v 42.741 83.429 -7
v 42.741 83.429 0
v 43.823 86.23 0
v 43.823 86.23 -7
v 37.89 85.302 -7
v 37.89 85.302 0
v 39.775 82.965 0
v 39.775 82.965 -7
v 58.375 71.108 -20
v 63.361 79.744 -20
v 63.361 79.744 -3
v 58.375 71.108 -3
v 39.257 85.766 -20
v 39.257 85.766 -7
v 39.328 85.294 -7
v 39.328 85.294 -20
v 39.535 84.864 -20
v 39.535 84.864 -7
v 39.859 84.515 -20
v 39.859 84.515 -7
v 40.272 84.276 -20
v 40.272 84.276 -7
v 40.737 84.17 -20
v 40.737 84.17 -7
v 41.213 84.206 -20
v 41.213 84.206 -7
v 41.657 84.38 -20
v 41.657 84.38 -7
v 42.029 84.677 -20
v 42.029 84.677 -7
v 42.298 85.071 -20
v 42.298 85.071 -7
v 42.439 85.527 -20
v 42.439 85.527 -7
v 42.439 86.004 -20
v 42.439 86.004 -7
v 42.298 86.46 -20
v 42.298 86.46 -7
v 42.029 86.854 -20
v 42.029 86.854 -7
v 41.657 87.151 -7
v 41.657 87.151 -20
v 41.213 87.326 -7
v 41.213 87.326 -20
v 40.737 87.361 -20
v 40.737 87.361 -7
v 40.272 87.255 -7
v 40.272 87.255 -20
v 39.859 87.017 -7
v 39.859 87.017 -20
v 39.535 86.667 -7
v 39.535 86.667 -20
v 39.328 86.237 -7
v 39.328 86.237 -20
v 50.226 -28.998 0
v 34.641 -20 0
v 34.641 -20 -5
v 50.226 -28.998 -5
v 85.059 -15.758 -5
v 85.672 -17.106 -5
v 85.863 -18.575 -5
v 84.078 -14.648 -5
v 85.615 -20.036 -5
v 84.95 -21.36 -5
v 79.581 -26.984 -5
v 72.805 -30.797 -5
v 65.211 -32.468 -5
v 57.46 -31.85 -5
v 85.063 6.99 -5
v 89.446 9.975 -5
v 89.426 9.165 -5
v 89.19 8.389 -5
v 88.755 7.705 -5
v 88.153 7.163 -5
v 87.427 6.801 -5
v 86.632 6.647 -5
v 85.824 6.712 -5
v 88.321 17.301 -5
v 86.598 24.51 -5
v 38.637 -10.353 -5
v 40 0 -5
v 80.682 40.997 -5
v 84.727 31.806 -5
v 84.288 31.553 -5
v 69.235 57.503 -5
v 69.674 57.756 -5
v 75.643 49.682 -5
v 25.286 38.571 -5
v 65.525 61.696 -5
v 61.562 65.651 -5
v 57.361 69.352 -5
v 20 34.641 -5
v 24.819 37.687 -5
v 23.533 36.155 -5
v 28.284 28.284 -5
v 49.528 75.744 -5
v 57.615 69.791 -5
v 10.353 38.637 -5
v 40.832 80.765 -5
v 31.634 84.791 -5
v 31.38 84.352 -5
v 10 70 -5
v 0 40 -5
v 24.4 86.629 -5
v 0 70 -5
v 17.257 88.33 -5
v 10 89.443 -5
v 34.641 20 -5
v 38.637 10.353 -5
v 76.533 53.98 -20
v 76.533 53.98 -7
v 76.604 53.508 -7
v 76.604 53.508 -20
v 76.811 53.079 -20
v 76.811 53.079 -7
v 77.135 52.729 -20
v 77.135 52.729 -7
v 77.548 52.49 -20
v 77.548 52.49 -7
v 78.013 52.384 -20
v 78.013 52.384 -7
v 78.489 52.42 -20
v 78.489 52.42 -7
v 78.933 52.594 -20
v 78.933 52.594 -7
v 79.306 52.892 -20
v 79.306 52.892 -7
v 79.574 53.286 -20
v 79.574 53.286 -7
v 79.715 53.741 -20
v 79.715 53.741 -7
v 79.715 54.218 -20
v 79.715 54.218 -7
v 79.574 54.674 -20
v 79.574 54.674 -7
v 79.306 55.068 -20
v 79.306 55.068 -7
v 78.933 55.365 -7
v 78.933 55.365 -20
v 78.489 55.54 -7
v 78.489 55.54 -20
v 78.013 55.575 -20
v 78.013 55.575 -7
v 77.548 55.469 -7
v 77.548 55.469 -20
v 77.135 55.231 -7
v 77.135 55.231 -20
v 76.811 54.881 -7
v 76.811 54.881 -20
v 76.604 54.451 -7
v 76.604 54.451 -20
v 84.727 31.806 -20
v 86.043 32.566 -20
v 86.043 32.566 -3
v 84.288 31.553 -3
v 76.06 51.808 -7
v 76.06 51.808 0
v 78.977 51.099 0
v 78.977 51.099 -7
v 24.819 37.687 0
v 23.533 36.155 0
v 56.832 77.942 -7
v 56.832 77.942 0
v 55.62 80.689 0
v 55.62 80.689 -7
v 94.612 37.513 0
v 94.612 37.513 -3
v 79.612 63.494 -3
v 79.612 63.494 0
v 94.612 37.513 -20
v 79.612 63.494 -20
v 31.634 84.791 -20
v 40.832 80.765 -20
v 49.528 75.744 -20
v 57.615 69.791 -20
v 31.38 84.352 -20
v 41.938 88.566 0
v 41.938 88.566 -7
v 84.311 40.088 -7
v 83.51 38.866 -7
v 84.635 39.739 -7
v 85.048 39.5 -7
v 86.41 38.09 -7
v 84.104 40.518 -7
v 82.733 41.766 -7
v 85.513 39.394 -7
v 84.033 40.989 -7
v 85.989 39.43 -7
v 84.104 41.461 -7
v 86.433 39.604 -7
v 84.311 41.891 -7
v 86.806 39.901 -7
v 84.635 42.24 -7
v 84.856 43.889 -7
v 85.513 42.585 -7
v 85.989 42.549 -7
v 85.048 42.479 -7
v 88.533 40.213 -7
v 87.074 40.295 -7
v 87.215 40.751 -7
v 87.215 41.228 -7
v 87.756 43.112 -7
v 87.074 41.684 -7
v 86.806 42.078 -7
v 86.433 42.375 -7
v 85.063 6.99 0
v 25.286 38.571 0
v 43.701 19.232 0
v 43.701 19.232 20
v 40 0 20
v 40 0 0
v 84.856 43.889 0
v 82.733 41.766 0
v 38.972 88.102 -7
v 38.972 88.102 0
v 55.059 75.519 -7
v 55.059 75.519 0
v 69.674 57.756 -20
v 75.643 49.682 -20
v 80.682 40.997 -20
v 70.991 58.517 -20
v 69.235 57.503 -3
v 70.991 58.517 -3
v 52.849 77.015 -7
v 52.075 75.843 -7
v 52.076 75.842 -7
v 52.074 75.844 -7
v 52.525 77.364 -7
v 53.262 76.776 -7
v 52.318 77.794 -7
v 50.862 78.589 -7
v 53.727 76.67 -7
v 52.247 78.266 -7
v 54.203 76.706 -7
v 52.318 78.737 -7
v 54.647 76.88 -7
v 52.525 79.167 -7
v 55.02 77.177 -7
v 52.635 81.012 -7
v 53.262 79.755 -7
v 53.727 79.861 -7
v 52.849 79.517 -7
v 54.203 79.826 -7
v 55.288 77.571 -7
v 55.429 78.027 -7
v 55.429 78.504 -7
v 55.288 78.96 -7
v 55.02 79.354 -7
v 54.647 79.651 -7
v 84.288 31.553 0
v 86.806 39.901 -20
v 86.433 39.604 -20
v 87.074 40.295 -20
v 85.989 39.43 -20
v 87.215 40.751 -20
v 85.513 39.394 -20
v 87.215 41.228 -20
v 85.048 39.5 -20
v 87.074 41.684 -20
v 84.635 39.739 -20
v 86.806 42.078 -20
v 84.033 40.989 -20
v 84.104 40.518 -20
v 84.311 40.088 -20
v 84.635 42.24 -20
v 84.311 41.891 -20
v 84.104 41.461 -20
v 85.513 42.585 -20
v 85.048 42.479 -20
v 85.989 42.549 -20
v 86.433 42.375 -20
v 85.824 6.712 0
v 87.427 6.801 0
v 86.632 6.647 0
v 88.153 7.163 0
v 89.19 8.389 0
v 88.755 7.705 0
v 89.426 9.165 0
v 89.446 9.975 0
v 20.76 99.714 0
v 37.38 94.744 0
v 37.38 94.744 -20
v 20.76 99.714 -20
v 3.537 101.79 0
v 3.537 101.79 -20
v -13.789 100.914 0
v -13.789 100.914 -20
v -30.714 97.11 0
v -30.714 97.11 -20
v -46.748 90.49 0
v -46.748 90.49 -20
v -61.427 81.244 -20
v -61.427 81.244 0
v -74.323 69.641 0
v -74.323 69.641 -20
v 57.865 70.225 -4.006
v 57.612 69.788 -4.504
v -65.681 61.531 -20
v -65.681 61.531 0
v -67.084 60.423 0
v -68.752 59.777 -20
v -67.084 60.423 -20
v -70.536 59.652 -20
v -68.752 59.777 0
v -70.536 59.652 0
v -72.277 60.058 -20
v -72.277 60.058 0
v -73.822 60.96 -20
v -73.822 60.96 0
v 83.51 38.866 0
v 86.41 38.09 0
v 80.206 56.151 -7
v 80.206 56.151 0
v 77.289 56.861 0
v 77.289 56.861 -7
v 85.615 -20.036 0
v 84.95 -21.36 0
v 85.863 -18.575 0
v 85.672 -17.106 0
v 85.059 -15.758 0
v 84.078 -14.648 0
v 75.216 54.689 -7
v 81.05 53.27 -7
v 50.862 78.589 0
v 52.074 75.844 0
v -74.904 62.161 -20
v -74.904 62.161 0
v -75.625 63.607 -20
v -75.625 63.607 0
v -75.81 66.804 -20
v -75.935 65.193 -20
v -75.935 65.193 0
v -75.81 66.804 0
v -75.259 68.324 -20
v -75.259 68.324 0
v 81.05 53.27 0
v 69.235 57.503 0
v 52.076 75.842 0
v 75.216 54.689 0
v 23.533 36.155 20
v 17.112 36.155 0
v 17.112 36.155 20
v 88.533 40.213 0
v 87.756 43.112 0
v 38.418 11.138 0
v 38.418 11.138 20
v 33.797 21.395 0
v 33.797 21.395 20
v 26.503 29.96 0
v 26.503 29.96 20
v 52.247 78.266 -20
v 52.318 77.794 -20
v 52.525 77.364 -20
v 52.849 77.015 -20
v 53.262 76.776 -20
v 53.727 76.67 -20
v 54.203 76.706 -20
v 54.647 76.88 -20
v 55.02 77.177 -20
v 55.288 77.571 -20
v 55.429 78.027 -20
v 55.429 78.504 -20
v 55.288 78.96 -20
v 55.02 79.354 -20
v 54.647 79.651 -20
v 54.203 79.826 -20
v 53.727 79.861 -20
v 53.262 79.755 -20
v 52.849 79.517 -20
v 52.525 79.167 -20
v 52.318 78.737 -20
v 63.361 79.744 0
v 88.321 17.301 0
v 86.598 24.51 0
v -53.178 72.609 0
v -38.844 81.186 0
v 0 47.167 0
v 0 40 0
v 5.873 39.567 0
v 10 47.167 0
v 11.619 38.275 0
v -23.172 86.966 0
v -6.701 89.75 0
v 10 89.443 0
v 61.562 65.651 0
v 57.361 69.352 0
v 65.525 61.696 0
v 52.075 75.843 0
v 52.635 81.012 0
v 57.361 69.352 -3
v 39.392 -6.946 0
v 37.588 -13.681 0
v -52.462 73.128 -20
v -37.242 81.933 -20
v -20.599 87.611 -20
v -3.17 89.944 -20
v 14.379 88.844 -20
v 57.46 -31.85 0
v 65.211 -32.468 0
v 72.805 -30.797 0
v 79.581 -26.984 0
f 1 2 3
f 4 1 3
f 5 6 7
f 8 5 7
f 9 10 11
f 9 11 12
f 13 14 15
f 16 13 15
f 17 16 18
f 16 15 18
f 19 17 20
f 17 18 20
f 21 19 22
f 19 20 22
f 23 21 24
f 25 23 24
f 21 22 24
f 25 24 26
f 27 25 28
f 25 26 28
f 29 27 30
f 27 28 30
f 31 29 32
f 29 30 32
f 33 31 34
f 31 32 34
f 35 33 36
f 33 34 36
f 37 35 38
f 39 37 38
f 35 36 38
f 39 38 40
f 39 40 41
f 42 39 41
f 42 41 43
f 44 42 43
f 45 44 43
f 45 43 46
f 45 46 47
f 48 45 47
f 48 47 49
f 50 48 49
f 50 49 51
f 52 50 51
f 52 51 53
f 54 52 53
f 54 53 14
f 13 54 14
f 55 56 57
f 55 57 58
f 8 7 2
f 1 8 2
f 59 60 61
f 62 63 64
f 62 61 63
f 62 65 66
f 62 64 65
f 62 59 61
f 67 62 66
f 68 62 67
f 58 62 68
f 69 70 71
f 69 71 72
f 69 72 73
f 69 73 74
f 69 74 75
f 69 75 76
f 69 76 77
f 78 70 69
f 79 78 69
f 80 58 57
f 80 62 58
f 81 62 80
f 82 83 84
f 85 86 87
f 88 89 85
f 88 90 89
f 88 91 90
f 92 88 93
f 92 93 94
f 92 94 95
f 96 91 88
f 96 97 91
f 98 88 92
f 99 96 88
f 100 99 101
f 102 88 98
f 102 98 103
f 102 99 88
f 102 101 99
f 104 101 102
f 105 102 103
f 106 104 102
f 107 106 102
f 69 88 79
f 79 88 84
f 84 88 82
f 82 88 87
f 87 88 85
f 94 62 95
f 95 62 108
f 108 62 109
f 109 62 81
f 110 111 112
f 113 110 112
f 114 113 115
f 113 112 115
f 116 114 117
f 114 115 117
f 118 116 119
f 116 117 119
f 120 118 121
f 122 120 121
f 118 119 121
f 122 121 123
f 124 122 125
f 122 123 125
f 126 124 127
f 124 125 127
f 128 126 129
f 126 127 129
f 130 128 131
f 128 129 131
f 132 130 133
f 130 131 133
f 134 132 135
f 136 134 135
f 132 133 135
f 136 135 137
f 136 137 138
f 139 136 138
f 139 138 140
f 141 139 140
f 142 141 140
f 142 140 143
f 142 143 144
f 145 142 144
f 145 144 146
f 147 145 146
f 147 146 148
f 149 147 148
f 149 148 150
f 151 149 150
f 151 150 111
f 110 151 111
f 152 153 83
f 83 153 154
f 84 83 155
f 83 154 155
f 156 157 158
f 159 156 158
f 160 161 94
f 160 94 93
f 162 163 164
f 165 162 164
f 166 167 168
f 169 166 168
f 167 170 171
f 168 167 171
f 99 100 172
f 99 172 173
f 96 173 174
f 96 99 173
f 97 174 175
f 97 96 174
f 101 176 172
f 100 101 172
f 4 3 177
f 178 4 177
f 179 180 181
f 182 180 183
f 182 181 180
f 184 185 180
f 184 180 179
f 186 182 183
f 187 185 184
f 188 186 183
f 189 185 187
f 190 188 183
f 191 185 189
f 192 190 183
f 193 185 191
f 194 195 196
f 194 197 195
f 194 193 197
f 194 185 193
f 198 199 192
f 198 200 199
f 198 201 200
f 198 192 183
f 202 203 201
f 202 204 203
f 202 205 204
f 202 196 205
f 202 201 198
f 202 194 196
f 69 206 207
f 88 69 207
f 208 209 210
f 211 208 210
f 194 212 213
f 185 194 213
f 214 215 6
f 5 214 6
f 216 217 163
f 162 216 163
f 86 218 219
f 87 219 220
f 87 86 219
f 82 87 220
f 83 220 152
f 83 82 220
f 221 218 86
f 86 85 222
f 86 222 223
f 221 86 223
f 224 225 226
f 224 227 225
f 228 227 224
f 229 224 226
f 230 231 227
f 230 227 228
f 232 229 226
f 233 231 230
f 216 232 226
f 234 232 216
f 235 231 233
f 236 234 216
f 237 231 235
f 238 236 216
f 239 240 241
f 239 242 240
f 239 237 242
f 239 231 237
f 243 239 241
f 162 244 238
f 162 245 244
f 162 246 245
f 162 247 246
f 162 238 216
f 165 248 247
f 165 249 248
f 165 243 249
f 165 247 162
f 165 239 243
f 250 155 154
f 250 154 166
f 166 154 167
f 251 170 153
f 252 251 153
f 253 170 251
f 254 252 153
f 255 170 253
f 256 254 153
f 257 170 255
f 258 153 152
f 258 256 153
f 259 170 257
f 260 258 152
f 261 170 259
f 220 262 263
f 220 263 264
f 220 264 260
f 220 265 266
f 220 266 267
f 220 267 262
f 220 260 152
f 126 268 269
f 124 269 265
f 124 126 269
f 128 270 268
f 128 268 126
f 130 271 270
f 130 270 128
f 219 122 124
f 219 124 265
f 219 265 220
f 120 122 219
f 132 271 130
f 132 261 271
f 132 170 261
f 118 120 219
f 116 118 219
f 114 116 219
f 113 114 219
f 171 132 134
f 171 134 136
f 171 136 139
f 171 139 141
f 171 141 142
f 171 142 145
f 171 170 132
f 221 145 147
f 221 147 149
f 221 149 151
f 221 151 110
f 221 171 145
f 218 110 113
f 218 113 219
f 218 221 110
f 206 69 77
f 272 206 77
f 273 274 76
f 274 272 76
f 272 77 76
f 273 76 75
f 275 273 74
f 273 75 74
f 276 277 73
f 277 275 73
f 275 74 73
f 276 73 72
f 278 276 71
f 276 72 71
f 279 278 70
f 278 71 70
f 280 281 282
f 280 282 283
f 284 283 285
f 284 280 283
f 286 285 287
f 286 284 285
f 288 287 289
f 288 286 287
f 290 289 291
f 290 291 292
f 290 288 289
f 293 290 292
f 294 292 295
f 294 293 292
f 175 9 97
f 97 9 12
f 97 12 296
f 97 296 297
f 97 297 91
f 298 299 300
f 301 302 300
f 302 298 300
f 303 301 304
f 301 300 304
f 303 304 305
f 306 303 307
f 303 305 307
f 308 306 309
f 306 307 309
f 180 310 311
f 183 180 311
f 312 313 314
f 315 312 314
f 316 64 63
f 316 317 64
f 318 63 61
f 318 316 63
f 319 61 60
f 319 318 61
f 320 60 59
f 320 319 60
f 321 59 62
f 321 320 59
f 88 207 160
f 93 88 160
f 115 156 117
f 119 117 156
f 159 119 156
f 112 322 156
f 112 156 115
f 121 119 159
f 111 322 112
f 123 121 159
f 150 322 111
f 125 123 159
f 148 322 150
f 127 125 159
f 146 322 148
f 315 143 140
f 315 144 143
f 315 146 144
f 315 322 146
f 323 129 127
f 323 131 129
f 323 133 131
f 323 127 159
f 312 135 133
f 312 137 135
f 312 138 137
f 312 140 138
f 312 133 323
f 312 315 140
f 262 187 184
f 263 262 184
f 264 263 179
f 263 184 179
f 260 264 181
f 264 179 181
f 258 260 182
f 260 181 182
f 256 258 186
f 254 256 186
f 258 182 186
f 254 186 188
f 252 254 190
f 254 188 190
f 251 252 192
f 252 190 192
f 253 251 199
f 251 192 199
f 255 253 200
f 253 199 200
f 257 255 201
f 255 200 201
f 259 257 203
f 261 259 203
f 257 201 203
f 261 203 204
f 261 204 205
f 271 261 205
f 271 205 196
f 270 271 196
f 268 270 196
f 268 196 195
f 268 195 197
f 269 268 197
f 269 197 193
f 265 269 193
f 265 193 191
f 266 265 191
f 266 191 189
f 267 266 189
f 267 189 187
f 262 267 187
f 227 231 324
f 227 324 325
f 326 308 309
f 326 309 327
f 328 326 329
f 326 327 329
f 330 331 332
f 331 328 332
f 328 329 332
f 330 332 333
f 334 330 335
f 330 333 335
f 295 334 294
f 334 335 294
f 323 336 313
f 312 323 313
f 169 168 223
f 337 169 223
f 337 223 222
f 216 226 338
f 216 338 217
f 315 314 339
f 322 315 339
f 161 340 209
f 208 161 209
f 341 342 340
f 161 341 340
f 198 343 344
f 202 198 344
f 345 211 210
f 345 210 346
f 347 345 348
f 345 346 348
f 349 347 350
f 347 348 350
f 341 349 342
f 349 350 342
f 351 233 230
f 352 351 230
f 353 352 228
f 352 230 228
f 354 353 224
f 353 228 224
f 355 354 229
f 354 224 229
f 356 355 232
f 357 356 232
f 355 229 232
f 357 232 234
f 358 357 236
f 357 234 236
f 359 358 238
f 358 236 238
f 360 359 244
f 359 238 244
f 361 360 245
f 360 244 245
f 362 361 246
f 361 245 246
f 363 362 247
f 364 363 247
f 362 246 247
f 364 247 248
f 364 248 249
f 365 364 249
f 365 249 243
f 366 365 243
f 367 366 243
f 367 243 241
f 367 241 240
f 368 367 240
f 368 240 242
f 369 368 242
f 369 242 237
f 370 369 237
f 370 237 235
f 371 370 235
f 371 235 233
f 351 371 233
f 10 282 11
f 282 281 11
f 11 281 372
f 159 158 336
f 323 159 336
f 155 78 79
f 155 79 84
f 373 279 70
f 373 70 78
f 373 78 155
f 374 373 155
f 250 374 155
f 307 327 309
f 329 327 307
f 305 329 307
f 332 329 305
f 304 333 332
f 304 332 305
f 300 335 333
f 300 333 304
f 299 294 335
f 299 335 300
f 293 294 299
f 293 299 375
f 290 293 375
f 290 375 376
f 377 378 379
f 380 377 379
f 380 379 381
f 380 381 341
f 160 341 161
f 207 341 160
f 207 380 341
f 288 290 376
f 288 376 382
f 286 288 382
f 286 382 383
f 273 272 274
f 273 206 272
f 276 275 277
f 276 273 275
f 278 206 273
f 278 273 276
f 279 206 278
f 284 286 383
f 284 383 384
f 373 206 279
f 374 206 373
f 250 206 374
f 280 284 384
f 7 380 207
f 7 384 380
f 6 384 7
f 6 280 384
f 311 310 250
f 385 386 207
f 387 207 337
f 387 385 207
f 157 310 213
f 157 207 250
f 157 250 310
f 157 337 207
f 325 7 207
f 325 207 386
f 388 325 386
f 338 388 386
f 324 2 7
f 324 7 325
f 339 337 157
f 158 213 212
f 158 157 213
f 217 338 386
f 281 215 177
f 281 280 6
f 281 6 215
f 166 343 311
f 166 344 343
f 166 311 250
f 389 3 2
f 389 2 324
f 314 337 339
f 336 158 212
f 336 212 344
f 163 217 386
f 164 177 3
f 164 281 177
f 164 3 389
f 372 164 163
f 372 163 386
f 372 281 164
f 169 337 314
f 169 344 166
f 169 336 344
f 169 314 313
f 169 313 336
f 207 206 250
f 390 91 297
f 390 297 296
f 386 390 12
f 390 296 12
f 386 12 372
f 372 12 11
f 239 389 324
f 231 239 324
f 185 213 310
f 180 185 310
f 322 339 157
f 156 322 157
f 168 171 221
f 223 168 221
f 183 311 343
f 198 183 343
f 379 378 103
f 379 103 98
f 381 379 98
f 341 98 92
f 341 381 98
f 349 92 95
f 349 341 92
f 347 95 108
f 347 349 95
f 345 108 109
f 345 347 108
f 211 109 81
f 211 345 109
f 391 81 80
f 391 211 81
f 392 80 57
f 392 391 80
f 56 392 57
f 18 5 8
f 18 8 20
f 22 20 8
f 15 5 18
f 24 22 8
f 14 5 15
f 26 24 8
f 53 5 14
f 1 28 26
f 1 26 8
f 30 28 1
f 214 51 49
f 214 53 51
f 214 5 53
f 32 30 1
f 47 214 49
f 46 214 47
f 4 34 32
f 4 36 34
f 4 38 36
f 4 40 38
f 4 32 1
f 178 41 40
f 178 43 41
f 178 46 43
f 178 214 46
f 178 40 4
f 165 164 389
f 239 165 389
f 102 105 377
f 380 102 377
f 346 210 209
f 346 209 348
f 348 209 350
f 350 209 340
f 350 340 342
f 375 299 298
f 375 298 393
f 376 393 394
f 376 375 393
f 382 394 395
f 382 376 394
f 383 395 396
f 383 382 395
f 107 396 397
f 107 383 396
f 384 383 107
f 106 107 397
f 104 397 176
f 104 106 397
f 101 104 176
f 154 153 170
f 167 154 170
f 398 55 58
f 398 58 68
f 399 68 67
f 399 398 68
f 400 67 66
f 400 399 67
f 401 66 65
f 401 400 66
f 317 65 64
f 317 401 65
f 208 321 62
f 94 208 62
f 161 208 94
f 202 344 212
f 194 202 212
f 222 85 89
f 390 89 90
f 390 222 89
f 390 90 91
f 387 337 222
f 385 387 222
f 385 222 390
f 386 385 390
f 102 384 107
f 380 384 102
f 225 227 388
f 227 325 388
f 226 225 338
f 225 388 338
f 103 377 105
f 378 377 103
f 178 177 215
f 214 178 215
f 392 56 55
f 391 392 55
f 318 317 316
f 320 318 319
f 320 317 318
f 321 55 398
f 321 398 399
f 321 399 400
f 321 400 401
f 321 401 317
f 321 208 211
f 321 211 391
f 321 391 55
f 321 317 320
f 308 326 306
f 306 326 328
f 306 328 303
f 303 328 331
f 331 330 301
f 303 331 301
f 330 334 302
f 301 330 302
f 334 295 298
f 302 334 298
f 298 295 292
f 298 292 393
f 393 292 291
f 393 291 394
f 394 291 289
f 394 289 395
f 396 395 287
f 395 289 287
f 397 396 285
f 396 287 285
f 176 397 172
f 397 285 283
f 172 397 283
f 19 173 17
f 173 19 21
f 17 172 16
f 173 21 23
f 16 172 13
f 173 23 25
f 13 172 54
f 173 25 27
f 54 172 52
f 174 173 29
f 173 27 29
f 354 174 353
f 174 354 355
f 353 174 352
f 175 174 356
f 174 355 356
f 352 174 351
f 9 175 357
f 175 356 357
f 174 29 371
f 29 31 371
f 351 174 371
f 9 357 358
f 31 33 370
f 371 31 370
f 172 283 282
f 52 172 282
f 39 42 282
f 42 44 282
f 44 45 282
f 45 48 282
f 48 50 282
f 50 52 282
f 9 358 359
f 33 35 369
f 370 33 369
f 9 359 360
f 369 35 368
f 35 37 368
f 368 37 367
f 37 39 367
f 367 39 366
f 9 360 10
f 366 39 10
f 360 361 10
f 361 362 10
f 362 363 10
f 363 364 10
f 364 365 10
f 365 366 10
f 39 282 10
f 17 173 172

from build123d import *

# Parameters (mm, degrees)
BOSS_EXTRUDE1_DEPTH  = 5
CUT_EXTRUDE1_DEPTH   = 10
BOSS_EXTRUDE3_START  = -3
SKETCH13_R           = 2.5
BOSS_EXTRUDE3_DEPTH  = 3
CHAMFER1_SIZE        = 2
BOSS_EXTRUDE7_DEPTH  = 17
SKETCH22_R           = 1.6
CUT_EXTRUDE4_DEPTH   = 20
CUT_EXTRUDE5_DEPTH   = 7
BOSS_EXTRUDE8_START  = -20
BOSS_EXTRUDE8_DEPTH  = 20
SKETCH26_R           = 90.5
SKETCH26_R_2         = 90
CUT_EXTRUDE6_DEPTH   = 15
BOSS_EXTRUDE9_START  = 20
BOSS_EXTRUDE9_DEPTH  = 20
BOSS_EXTRUDE11_DEPTH = 20
FILLET2_R            = 6
CUT_EXTRUDE8_DEPTH   = 5
FILLET3_R            = 5
CUT_EXTRUDE9_DEPTH   = 5
FILLET4_R            = 3
CUT_EXTRUDE11_DEPTH  = 5
FILLET5_R            = 3


# Some blends are built 0.0001 mm under size
with BuildPart() as part:
    # Sketch1 → Boss-Extrude1 (new body)
    with BuildSketch(Plane.XY):
        with BuildLine():
            Line((10, 70), (0, 70))
            Line((0, 70), (0, 40))
            ThreePointArc((0, 40), (34.641016151, 20), (34.641016151, -20))
            Line((34.641016151, -20), (50.226140717, -28.998075863))
            ThreePointArc((50.226140717, -28.998075863), (74.464134482, -30.098388714), (89.334294573, -10.926290001))
            ThreePointArc((89.334294573, -10.926290001), (70.606727842, 55.809407661), (10, 89.4427191))
            Line((10, 89.4427191), (10, 70))
        make_face()
    extrude(amount=-BOSS_EXTRUDE1_DEPTH)

    # Sketch10 → Cut-Extrude1 (cut)
    with BuildSketch(Plane.ZY):
        Polygon((-5, 70), (0, 47.166644618), (0, 70), align=None)
    extrude(amount=-CUT_EXTRUDE1_DEPTH, mode=Mode.SUBTRACT)

    # Sketch13 → Boss-Extrude3 (add)
    # profile 1 of 2: a face of its own
    with BuildSketch(Plane.XY.offset(BOSS_EXTRUDE3_START)):
        with BuildLine():
            Line((37.380217316, 94.74443559), (31.380217316, 84.352130745))
            ThreePointArc((31.380217316, 84.352130745), (45, 77.942286341), (57.36097943, 69.352130745))
            Line((57.36097943, 69.352130745), (63.36097943, 79.74443559))
            Line((63.36097943, 79.74443559), (37.380217316, 94.74443559))
        make_face()
        with Locations((40.856551784, 85.765623512)):
            Circle(SKETCH13_R, mode=Mode.SUBTRACT)
        with Locations((53.846932841, 78.265623512)):
            Circle(SKETCH13_R, mode=Mode.SUBTRACT)
    # profile 2 of 2: a face of its own
    with BuildSketch(Plane.XY.offset(BOSS_EXTRUDE3_START)):
        with BuildLine():
            Line((79.611529559, 63.493885461), (69.234612109, 57.502769378))
            ThreePointArc((69.234612109, 57.502769378), (77.850059036, 45.159365674), (84.287765503, 31.552695391))
            Line((84.287765503, 31.552695391), (94.611529559, 37.513123348))
            Line((94.611529559, 37.513123348), (79.611529559, 63.493885461))
        make_face()
        with Locations((85.63271748, 40.989457815)):
            Circle(SKETCH13_R, mode=Mode.SUBTRACT)
        with Locations((78.13271748, 53.979838872)):
            Circle(SKETCH13_R, mode=Mode.SUBTRACT)
    extrude(amount=BOSS_EXTRUDE3_DEPTH)

    # Chamfer1
    chamfer1_edges = [part.edges().sort_by_distance(p)[0] for p in [
        (45, 77.942286341, -3),
    ]]
    chamfer(chamfer1_edges, length=CHAMFER1_SIZE - 0.0001)  # a hair under: the kernel refuses the full size

    # Sketch21 → Boss-Extrude7 (add)
    with BuildSketch(Plane(origin=(0, 0, -3), x_dir=(-1, 0, 0), z_dir=(0, 0, -1))):
        with BuildLine():
            Line((-32.394087652, 86.108205679), (-37.380217316, 94.74443559))
            Line((-37.380217316, 94.74443559), (-63.36097943, 79.74443559))
            Line((-63.36097943, 79.74443559), (-58.374849766, 71.108205679))
            ThreePointArc((-58.374849766, 71.108205679), (-46, 79.674337148), (-32.394087652, 86.108205679))
        make_face()
        with BuildLine():
            Line((-86.043250616, 32.566225194), (-94.611529559, 37.513123348))
            Line((-94.611529559, 37.513123348), (-79.611529559, 63.493885461))
            Line((-79.611529559, 63.493885461), (-70.991284652, 58.516984744))
            ThreePointArc((-70.991284652, 58.516984744), (-79.582170095, 46.159269957), (-86.043250616, 32.566225194))
        make_face()
    extrude(amount=BOSS_EXTRUDE7_DEPTH)

    # Sketch22 → Cut-Extrude4 (cut)
    with BuildSketch(Plane.XY):
        with Locations(Location((40.856551784, 85.765623512, 0), (0, 0, 180))):
            Circle(SKETCH22_R)
        with Locations(Location((53.846932841, 78.265623512, 0), (0, 0, 180))):
            Circle(SKETCH22_R)
        with Locations(Location((78.13271748, 53.979838872, 0), (0, 0, 180))):
            Circle(SKETCH22_R)
        with Locations(Location((85.63271748, 40.989457815, 0), (0, 0, 180))):
            Circle(SKETCH22_R)
    extrude(amount=-CUT_EXTRUDE4_DEPTH, mode=Mode.SUBTRACT)

    # Sketch24 → Cut-Extrude5 (cut)
    with BuildSketch(Plane.XY):
        Polygon((42.741480602, 83.428878621), (43.82269663, 86.229647308), (41.937767812, 88.566392198), (38.971622965, 88.102368402), (37.890406937, 85.301599716), (39.775335756, 82.964854825), align=None)
        Polygon((55.059031292, 75.518961778), (56.831660903, 77.942000695), (55.619562452, 80.688662429), (52.634834389, 81.012285245), (50.862204778, 78.589246328), (52.074303229, 75.842584594), align=None)
        Polygon((78.97688632, 51.098743194), (81.049903948, 53.270362694), (80.205735108, 56.151458371), (77.28854864, 56.860934549), (75.215531013, 54.68931505), (76.059699853, 51.808219373), align=None)
        Polygon((86.409892613, 38.089572965), (88.532678995, 40.212568798), (87.755503862, 43.112453649), (84.855542347, 43.889342666), (82.732755965, 41.766346832), (83.509931098, 38.866461981), align=None)
    extrude(amount=-CUT_EXTRUDE5_DEPTH, mode=Mode.SUBTRACT)

    # Sketch25 → Boss-Extrude8 (add)
    with BuildSketch(Plane(origin=(0, 0, -20), x_dir=(-1, 0, 0), z_dir=(0, 0, -1)).offset(BOSS_EXTRUDE8_START)):
        with BuildLine():
            Line((-86.043250616, 32.566225194), (-84.287765503, 31.552695391))
            ThreePointArc((-84.287765503, 31.552695391), (-77.850059036, 45.159365674), (-69.234612109, 57.502769378))
            Line((-69.234612109, 57.502769378), (-70.991284652, 58.516984744))
            ThreePointArc((-70.991284652, 58.516984744), (-79.582170095, 46.159269957), (-86.043250616, 32.566225194))
        make_face()
        with BuildLine():
            Line((-58.374849766, 71.108205679), (-57.36097943, 69.352130745))
            ThreePointArc((-57.36097943, 69.352130745), (-45, 77.942286341), (-31.380217316, 84.352130745))
            Line((-31.380217316, 84.352130745), (-32.394087652, 86.108205679))
            ThreePointArc((-32.394087652, 86.108205679), (-46, 79.674337148), (-58.374849766, 71.108205679))
        make_face()
    extrude(amount=BOSS_EXTRUDE8_DEPTH)

    # Sketch26 → Cut-Extrude6 (cut)
    with BuildSketch(Plane(origin=(0, 0, -5), x_dir=(-1, 0, 0), z_dir=(0, 0, -1))):
        Circle(SKETCH26_R)
        Circle(SKETCH26_R_2, mode=Mode.SUBTRACT)
    extrude(amount=CUT_EXTRUDE6_DEPTH, mode=Mode.SUBTRACT)

    # Sketch28 → Boss-Extrude9 (add)
    with BuildSketch(Plane.XY.offset(BOSS_EXTRUDE9_START)):
        with BuildLine():
            Line((23.533293218, 36.154783936), (43.701329204, 19.231792379))
            Line((43.701329204, 19.231792379), (40, 0))
            ThreePointArc((40, 0), (33.797136862, 21.395175623), (17.112323002, 36.154783936))
            Line((17.112323002, 36.154783936), (23.533293218, 36.154783936))
        make_face()
    extrude(amount=-BOSS_EXTRUDE9_DEPTH)

    # Sketch30 → Boss-Extrude11 (add)
    with BuildSketch(Plane.XY):
        with BuildLine():
            Line((31.380217316, 84.352130745), (37.380217316, 94.74443559))
            ThreePointArc((37.380217316, 94.74443559), (-25.433217284, 98.625251232), (-78.536554117, 64.8521271))
            Line((-78.536554117, 64.8521271), (-69.397791898, 57.305728157))
            ThreePointArc((-69.397791898, 57.305728157), (-23.328329719, 86.92404174), (31.380217316, 84.352130745))
        make_face()
    extrude(amount=-BOSS_EXTRUDE11_DEPTH)

    # Fillet2
    # the kernel refuses this fillet: 6 mm, written as the material it takes off along each edge
    with BuildSketch(Plane(origin=(-69.397791898, 57.305728157, 14.53079134), x_dir=(0.6605272706079757, 0.7508020543280219, 0), z_dir=(0, 0, -1))) as fillet2_piece_1:
        with BuildLine():
            CenterArc((5.815342996, -5.997066729), FILLET2_R, 91.791660849, 86.416678302)
            Line((-0.181723733, -5.809475019), (0, 0))
            ThreePointArc((0, 0), (2.813875643, -0.043999067), (5.627751287, 0))
        make_face()
    extrude(amount=49.06158268, mode=Mode.SUBTRACT)
    with BuildSketch(Plane(origin=(-78.536554117, 64.8521271, 15.946769714), x_dir=(0.6605636178718797, 0.7507700758181651, 0), z_dir=(0, 0, -1))) as fillet2_piece_2:
        with BuildLine():
            CenterArc((6.190825845, 5.99705764), FILLET2_R, 178.205565332, 93.588869337)
            Line((0.193768204, 6.184939681), (0, 0))
            ThreePointArc((0, 0), (3.189353943, -0.049947441), (6.378707886, 0))
        make_face()
    extrude(amount=51.893539428, mode=Mode.SUBTRACT)

    # Sketch31 → Cut-Extrude8 (cut)
    with BuildSketch(Plane(origin=(0, 0, 0), x_dir=(-1, 0, 0), z_dir=(0, 0, -1))):
        Polygon((-126.538851056, -27.990413584), (-128.420531953, -25.747913615), (-227.900156191, -109.221229623), (-215.044403998, -124.542118485), (-23.533293218, 36.154783936), (-24.818868437, 37.686872822), (-88.130475533, 4.238040152), align=None)
    extrude(amount=CUT_EXTRUDE8_DEPTH, mode=Mode.SUBTRACT)

    # Fillet3
    fillet3_edges = [part.edges().sort_by_distance(p)[0] for p in [
        (87.283893388, -17.338321154, -2.5),
    ]]
    fillet(fillet3_edges, radius=FILLET3_R)

    # Sketch32 → Cut-Extrude9 (cut)
    with BuildSketch(Plane.XY):
        Polygon((87.46553992, 4.589339402), (92.809930085, 1.765787441), (89.670227424, 2.292669877), align=None)
    extrude(amount=-CUT_EXTRUDE9_DEPTH, mode=Mode.SUBTRACT)

    # Fillet4
    fillet4_edges = [part.edges().sort_by_distance(p)[0] for p in [
        (89.94013986, 3.281957025, -2.5),
    ]]
    fillet(fillet4_edges, radius=FILLET4_R)

    # Sketch33 → Cut-Extrude11 (cut)
    with BuildSketch(Plane.XY):
        Polygon((24.818868437, 37.686872822), (88.601440511, 3.989219605), (89.06857455, 4.873406118), (25.286002476, 38.571059335), align=None)
    extrude(amount=-CUT_EXTRUDE11_DEPTH, mode=Mode.SUBTRACT)

    # Fillet5
    # the kernel refuses this fillet: 3 mm, written as the material it takes off along each edge
    with BuildSketch(Plane(origin=(87.631958407, 5.632400166, -16.76496935), x_dir=(0.385373580220951, 0.9227606426737577, 0), z_dir=(0, 0, 1))) as fillet5_piece_1:
        with BuildLine():
            CenterArc((3.250174857, 2.623091468), FILLET5_R, 174.818513503, 124.211713056)
            Line((0.262433961, 2.894023819), (-0.036340129, 2.921117054))
            Line((-0.036340129, 2.921117054), (-0.29877409, 0.027093235))
            Line((-0.29877409, 0.027093235), (-0.219376832, -0.204630901))
            ThreePointArc((-0.219376832, -0.204630901), (3.755091894, -0.860969557), (4.851569028, -0.262309147))
            Line((4.851569028, -0.262309147), (4.70598774, 0))
        make_face()
    extrude(amount=28.529938699, mode=Mode.SUBTRACT)


solid = part.part
